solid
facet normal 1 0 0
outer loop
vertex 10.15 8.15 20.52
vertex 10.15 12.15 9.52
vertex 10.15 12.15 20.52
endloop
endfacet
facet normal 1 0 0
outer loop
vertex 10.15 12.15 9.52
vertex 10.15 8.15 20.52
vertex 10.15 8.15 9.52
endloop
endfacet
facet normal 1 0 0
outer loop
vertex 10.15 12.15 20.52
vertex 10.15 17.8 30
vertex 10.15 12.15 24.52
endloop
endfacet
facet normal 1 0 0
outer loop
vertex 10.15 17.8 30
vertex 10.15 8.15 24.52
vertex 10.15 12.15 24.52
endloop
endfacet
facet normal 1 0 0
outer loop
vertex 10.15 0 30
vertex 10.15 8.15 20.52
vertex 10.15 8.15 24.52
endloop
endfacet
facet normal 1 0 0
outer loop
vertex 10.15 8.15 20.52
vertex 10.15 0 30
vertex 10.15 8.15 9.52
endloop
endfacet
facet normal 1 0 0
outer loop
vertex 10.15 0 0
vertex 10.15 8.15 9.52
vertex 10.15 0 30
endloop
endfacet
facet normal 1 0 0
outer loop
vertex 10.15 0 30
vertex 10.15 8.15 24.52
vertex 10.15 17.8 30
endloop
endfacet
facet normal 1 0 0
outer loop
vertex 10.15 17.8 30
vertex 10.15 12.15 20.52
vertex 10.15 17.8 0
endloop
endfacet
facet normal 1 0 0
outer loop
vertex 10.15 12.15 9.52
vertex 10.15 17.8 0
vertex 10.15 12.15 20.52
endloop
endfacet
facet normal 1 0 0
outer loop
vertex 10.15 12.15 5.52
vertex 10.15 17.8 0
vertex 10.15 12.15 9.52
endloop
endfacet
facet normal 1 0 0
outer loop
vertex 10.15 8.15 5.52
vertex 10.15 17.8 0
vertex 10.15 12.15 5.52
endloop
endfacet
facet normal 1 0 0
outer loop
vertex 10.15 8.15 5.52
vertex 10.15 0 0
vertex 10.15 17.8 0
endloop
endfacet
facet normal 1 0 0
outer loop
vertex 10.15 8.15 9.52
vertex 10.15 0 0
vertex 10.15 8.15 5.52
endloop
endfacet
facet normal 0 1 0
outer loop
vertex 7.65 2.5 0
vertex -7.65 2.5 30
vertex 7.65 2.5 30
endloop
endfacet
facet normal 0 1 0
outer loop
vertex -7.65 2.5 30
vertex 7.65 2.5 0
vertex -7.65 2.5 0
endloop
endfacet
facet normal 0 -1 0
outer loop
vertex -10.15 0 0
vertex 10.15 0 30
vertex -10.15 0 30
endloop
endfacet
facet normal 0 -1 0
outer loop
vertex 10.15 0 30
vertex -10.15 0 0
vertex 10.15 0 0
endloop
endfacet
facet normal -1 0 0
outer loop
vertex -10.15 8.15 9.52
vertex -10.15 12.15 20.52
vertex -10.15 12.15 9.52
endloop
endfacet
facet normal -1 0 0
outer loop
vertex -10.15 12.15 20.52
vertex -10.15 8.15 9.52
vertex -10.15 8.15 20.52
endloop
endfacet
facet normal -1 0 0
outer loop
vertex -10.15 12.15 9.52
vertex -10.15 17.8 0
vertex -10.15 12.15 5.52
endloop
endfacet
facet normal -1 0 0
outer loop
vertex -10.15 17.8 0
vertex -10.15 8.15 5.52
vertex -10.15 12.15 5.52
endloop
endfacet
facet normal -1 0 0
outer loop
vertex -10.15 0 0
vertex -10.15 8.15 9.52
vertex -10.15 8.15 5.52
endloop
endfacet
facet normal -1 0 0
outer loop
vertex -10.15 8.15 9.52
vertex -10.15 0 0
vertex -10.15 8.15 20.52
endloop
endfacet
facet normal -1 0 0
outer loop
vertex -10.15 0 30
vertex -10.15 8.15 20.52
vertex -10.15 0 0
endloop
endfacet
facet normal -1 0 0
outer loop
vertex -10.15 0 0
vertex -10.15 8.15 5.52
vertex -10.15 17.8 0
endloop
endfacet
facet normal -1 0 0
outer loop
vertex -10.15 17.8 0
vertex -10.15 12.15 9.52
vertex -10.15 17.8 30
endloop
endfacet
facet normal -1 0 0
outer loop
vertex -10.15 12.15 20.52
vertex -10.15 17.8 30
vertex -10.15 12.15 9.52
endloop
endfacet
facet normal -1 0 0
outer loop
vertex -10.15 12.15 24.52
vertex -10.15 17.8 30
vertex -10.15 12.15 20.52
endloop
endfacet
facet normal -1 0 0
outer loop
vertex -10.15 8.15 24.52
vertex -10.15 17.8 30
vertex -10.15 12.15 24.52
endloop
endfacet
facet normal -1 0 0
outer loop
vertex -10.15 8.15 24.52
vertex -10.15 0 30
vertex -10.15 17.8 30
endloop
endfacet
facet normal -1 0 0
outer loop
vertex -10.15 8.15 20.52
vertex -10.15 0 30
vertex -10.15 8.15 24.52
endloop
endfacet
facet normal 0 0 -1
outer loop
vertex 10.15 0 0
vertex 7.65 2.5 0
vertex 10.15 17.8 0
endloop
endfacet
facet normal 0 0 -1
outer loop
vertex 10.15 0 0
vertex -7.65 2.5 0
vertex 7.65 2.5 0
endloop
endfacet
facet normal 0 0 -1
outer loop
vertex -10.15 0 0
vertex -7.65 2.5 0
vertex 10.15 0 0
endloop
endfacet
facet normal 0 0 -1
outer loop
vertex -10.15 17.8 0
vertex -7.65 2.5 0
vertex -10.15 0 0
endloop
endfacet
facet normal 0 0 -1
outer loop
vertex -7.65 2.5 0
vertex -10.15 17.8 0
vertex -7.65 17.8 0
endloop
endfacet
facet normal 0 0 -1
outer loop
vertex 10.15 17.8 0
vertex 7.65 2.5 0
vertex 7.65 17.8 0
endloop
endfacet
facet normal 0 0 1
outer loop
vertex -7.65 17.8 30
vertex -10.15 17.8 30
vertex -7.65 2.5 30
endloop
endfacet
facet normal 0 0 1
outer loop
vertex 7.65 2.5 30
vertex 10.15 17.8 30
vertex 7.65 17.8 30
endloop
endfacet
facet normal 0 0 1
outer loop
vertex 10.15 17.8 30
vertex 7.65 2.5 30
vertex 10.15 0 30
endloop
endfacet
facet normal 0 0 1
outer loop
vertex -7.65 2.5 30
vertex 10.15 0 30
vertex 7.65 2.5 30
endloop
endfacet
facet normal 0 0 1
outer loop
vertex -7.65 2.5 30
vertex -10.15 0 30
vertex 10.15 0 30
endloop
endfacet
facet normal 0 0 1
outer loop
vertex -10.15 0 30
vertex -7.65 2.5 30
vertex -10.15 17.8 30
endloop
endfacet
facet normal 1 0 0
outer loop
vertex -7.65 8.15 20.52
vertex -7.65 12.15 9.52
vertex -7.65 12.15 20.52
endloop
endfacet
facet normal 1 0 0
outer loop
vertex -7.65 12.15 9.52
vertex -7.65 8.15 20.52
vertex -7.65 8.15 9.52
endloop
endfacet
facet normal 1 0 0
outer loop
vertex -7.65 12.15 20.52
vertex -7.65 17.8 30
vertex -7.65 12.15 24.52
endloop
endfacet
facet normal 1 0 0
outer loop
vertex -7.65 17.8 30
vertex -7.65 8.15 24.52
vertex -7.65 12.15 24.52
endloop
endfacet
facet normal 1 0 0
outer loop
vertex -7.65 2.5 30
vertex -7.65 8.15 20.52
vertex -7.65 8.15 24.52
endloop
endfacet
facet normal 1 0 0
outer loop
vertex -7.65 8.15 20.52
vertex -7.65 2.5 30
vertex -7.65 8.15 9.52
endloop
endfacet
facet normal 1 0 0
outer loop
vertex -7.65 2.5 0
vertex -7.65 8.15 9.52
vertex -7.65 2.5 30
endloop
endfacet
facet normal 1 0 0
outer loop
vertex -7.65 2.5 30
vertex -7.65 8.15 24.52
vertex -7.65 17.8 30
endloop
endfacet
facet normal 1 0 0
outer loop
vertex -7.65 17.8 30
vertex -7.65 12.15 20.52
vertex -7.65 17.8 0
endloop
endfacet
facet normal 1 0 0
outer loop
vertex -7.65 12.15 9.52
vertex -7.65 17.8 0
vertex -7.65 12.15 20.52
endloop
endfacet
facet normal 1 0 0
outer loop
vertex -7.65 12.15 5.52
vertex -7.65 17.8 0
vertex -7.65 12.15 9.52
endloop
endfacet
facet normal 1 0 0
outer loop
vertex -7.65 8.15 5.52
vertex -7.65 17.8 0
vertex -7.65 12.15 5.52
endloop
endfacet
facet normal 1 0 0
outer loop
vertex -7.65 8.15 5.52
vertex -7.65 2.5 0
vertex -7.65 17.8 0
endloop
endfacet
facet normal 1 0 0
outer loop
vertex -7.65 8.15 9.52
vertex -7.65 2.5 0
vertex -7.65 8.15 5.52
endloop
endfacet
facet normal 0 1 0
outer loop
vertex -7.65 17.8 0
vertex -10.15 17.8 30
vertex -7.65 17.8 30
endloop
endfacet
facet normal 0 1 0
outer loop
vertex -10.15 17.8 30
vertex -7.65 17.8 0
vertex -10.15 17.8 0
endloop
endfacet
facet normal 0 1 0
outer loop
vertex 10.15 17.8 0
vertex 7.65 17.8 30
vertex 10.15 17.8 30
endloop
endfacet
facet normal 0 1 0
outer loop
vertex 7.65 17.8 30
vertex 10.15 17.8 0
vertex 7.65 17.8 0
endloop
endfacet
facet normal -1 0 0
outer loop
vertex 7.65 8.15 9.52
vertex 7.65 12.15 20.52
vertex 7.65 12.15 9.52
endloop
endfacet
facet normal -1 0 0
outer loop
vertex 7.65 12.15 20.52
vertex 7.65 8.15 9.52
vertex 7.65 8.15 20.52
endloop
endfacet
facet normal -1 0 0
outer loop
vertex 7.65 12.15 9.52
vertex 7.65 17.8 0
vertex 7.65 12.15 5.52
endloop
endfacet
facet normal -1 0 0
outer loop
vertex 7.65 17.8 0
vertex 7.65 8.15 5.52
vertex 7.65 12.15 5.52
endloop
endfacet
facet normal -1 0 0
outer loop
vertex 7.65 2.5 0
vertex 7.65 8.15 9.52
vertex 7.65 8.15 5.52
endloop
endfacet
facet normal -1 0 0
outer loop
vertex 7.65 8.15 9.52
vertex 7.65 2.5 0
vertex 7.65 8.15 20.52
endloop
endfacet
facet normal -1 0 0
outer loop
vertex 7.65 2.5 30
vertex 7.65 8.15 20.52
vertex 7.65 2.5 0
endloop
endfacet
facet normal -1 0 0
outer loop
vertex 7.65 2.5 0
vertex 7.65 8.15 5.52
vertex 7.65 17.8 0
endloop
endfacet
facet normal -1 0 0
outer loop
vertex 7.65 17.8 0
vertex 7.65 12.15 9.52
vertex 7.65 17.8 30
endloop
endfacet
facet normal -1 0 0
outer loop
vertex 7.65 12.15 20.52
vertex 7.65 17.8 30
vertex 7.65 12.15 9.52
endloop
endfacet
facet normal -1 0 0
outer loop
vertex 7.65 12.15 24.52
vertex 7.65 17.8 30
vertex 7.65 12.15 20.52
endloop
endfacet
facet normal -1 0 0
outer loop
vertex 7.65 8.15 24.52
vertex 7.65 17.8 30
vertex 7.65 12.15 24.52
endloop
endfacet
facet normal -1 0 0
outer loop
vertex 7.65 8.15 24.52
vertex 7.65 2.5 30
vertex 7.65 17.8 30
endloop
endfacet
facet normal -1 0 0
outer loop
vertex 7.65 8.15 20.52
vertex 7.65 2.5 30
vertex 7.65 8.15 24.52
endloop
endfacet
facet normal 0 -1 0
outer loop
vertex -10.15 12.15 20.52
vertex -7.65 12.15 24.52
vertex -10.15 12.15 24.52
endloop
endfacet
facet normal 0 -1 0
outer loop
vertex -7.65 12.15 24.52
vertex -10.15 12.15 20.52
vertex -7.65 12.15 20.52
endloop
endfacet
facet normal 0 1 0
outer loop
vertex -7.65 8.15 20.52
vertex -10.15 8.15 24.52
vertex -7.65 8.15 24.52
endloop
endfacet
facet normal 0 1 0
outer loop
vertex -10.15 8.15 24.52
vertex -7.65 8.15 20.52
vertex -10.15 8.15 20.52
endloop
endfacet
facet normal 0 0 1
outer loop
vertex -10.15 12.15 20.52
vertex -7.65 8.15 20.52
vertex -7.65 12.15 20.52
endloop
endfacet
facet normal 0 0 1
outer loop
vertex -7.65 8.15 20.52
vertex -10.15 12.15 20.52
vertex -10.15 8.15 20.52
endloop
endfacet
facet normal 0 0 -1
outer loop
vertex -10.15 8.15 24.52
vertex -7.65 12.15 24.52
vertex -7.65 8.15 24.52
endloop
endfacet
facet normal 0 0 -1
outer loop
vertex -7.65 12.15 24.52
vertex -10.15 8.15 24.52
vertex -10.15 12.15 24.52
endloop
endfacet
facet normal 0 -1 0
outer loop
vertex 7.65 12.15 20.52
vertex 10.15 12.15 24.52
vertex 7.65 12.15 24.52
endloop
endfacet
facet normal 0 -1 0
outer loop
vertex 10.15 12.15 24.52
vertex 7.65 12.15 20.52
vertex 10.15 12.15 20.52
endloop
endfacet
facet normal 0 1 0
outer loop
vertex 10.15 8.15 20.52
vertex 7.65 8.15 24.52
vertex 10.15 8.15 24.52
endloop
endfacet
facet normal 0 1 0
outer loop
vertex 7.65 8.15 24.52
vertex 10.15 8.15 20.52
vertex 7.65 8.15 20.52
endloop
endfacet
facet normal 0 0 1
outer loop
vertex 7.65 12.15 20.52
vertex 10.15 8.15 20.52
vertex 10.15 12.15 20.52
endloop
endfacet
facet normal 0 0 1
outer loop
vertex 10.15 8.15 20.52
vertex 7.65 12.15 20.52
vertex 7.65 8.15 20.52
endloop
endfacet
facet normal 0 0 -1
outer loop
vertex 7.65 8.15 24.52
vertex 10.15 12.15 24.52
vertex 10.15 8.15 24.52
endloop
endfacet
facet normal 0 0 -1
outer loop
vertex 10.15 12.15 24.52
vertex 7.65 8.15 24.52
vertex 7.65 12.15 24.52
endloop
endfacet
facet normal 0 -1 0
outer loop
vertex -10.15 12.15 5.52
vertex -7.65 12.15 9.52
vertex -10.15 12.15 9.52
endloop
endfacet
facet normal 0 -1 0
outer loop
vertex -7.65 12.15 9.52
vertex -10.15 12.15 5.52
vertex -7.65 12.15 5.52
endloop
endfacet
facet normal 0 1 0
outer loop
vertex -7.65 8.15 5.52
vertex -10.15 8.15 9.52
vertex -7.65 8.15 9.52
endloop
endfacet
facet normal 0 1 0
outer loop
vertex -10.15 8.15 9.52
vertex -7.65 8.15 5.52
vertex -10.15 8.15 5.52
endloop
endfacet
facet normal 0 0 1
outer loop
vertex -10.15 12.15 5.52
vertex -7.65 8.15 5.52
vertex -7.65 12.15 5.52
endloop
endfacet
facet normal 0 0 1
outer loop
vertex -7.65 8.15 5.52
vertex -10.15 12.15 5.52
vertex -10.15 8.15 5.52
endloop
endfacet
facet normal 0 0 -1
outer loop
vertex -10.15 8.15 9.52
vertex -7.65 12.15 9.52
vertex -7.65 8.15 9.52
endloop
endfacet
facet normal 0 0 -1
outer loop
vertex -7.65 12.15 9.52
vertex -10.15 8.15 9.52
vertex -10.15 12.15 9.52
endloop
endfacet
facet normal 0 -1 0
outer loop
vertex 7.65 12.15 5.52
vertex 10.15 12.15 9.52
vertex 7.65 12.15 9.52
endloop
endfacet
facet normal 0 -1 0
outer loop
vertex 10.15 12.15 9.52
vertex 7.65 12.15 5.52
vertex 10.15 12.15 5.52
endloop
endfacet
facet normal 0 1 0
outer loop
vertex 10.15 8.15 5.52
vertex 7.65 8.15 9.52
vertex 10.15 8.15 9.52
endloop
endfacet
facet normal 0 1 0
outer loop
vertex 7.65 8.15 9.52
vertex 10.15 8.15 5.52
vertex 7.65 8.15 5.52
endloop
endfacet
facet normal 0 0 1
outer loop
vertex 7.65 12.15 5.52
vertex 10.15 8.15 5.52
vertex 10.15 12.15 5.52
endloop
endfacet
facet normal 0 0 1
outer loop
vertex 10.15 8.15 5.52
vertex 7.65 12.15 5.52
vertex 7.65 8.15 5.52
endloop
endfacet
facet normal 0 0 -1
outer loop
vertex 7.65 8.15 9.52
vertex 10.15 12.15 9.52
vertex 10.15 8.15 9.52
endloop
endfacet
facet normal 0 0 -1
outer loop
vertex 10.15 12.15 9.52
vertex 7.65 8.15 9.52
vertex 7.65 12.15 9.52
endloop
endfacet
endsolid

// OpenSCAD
// file: _homeracker_switch_u_bracket_lib.scad
// HomeRacker switch U bracket - shared geometry.
//
// A plain U-channel that slides along a HomeRacker support (used here as
// a horizontal rail) and locks in place with the support's own lock
// pins. The channel's cavity runs its full length, uninterrupted, so the
// rail passes freely through. No stop, lip, or corner catch - just the
// channel itself.
//
// See homeracker_switch_u_bracket.scad, which includes this file and
// calls render_bracket(). This file has no directly renderable geometry
// of its own (build_stl.py skips files starting with "_").
//
// HomeRacker (https://homeracker.org) supports are solid 15x15mm printed
// posts (their BASE_UNIT). Their official system locks accessories to the
// post using 4mm square "lock pins" through holes spaced every 15mm (see
// sample.stl in this directory, one of their real parts) - this bracket
// uses that same hole pattern through both side walls, but stays an open
// U-channel rather than sample.stl's closed 4-wall box (that box is a
// coupler meant to sleeve over two abutting support rods end-to-end;
// this piece only ever needs to grip one support from three sides).
//
// PRINTABILITY: printed standing on the end of the channel, rotated 90
// degrees about the X axis from how it's drawn/used here (see
// render_bracket() at the bottom), rather than lying on its side. In
// that orientation the rail direction (Y) becomes the print's vertical
// axis, so the U-channel's cross-section - constant along its whole
// length - just extrudes straight up with no bridge and no cavity roof
// to print. Zero overhangs anywhere in the part.

mm_per_inch = 25.4;

// ---- Parameters (inches) ----
// Values are HomeRacker's real millimeter spec (see comments) converted
// to inches, so the geometry below can stay in one consistent unit and
// scale to the correct real-world size at the very end (render_bracket).

// Post / rail fit - matches the real HomeRacker support (15x15mm).
base_unit = 15 / mm_per_inch;    // HomeRacker's base unit (15mm) - support
                    // cross-section and lock-pin hole spacing both derive
                    // from this
post_size = base_unit; // support cross-section (both axes)
wall      = 2.5 / mm_per_inch;   // channel wall thickness (2.5mm)
tol       = 0.3 / mm_per_inch;   // clearance so the channel slides freely
                    // along the rail (0.3mm) - loosen/tighten this if it
                    // binds or wobbles
sleeve_len = 2 * base_unit; // how much of the rail's length the channel grips -
                    // keep this a multiple of base_unit so the lock-pin
                    // holes below land where the rail's own holes do

// Lock-pin holes through both side walls, matching the real HomeRacker
// part in sample.stl - one per base_unit of length, centered in each
// unit, same 4mm square size they use. Push one of their lock pins (or
// a snug scrap of 4mm square rod) through to keep the bracket from
// sliding once you've picked a position.
lockpin_holes = true;
lockpin_side  = 4 / mm_per_inch; // hole side length (4mm, matches their
                    // LOCKPIN_HOLE_SIDE_LENGTH)

eps = 0.02 / mm_per_inch; // small overlap/overshoot so booleans stay watertight
$fn = 32;

// ---- Derived dimensions ----
Wc = post_size + 2 * wall + tol;             // outer width of the channel
channel_height = wall + post_size + tol;     // height of the channel's side rails

// ---- Modules ----

// The U-channel: floor across the full width, two side rails, open top.
// The rail threads through freely along its whole length (open at both
// ends in Y), so it can continue past the bracket in either direction.
module channel() {
    difference() {
        union() {
            // floor
            translate([-Wc / 2, 0, 0]) cube([Wc, sleeve_len, wall]);
            // side rails
            translate([-Wc / 2, 0, 0]) cube([wall, sleeve_len, channel_height]);
            translate([Wc / 2 - wall, 0, 0]) cube([wall, sleeve_len, channel_height]);
        }
        // rail cavity, open at the top
        translate([-(post_size + tol) / 2, -eps, wall])
            cube([post_size + tol, sleeve_len + 2 * eps, channel_height + eps]);
    }
}

// One square lock-pin hole through a side wall, centered on the channel's
// height, at unit index i (0-based) along the sleeve's length.
module lockpin_hole(x0) {
    translate([x0, -eps, wall + (post_size + tol) / 2 - lockpin_side / 2])
        cube([wall + 2 * eps, lockpin_side, lockpin_side]);
}

module lockpin_holes_both_sides() {
    num_units = floor(sleeve_len / base_unit);
    for (i = [0 : num_units - 1]) {
        y0 = i * base_unit + base_unit / 2 - lockpin_side / 2;
        translate([0, y0, 0]) {
            lockpin_hole(-Wc / 2 - eps);
            lockpin_hole(Wc / 2 - wall - eps);
        }
    }
}

module u_bracket() {
    difference() {
        channel();
        if (lockpin_holes) {
            lockpin_holes_both_sides();
        }
    }
}

// Flips the part onto its best print orientation (see PRINTABILITY above)
// and scales the whole thing from the inch-based working units up to
// real-world millimeters for the exported STL.
module render_bracket() {
    scale([mm_per_inch, mm_per_inch, mm_per_inch])
        translate([0, 0, sleeve_len])
            rotate([-90, 0, 0])
                u_bracket();
}
// main file
// HomeRacker switch U bracket - plain U-channel, no stop or lip. See
// _homeracker_switch_u_bracket_lib.scad for the full design notes.
include <_homeracker_switch_u_bracket_lib.scad>
render_bracket();
